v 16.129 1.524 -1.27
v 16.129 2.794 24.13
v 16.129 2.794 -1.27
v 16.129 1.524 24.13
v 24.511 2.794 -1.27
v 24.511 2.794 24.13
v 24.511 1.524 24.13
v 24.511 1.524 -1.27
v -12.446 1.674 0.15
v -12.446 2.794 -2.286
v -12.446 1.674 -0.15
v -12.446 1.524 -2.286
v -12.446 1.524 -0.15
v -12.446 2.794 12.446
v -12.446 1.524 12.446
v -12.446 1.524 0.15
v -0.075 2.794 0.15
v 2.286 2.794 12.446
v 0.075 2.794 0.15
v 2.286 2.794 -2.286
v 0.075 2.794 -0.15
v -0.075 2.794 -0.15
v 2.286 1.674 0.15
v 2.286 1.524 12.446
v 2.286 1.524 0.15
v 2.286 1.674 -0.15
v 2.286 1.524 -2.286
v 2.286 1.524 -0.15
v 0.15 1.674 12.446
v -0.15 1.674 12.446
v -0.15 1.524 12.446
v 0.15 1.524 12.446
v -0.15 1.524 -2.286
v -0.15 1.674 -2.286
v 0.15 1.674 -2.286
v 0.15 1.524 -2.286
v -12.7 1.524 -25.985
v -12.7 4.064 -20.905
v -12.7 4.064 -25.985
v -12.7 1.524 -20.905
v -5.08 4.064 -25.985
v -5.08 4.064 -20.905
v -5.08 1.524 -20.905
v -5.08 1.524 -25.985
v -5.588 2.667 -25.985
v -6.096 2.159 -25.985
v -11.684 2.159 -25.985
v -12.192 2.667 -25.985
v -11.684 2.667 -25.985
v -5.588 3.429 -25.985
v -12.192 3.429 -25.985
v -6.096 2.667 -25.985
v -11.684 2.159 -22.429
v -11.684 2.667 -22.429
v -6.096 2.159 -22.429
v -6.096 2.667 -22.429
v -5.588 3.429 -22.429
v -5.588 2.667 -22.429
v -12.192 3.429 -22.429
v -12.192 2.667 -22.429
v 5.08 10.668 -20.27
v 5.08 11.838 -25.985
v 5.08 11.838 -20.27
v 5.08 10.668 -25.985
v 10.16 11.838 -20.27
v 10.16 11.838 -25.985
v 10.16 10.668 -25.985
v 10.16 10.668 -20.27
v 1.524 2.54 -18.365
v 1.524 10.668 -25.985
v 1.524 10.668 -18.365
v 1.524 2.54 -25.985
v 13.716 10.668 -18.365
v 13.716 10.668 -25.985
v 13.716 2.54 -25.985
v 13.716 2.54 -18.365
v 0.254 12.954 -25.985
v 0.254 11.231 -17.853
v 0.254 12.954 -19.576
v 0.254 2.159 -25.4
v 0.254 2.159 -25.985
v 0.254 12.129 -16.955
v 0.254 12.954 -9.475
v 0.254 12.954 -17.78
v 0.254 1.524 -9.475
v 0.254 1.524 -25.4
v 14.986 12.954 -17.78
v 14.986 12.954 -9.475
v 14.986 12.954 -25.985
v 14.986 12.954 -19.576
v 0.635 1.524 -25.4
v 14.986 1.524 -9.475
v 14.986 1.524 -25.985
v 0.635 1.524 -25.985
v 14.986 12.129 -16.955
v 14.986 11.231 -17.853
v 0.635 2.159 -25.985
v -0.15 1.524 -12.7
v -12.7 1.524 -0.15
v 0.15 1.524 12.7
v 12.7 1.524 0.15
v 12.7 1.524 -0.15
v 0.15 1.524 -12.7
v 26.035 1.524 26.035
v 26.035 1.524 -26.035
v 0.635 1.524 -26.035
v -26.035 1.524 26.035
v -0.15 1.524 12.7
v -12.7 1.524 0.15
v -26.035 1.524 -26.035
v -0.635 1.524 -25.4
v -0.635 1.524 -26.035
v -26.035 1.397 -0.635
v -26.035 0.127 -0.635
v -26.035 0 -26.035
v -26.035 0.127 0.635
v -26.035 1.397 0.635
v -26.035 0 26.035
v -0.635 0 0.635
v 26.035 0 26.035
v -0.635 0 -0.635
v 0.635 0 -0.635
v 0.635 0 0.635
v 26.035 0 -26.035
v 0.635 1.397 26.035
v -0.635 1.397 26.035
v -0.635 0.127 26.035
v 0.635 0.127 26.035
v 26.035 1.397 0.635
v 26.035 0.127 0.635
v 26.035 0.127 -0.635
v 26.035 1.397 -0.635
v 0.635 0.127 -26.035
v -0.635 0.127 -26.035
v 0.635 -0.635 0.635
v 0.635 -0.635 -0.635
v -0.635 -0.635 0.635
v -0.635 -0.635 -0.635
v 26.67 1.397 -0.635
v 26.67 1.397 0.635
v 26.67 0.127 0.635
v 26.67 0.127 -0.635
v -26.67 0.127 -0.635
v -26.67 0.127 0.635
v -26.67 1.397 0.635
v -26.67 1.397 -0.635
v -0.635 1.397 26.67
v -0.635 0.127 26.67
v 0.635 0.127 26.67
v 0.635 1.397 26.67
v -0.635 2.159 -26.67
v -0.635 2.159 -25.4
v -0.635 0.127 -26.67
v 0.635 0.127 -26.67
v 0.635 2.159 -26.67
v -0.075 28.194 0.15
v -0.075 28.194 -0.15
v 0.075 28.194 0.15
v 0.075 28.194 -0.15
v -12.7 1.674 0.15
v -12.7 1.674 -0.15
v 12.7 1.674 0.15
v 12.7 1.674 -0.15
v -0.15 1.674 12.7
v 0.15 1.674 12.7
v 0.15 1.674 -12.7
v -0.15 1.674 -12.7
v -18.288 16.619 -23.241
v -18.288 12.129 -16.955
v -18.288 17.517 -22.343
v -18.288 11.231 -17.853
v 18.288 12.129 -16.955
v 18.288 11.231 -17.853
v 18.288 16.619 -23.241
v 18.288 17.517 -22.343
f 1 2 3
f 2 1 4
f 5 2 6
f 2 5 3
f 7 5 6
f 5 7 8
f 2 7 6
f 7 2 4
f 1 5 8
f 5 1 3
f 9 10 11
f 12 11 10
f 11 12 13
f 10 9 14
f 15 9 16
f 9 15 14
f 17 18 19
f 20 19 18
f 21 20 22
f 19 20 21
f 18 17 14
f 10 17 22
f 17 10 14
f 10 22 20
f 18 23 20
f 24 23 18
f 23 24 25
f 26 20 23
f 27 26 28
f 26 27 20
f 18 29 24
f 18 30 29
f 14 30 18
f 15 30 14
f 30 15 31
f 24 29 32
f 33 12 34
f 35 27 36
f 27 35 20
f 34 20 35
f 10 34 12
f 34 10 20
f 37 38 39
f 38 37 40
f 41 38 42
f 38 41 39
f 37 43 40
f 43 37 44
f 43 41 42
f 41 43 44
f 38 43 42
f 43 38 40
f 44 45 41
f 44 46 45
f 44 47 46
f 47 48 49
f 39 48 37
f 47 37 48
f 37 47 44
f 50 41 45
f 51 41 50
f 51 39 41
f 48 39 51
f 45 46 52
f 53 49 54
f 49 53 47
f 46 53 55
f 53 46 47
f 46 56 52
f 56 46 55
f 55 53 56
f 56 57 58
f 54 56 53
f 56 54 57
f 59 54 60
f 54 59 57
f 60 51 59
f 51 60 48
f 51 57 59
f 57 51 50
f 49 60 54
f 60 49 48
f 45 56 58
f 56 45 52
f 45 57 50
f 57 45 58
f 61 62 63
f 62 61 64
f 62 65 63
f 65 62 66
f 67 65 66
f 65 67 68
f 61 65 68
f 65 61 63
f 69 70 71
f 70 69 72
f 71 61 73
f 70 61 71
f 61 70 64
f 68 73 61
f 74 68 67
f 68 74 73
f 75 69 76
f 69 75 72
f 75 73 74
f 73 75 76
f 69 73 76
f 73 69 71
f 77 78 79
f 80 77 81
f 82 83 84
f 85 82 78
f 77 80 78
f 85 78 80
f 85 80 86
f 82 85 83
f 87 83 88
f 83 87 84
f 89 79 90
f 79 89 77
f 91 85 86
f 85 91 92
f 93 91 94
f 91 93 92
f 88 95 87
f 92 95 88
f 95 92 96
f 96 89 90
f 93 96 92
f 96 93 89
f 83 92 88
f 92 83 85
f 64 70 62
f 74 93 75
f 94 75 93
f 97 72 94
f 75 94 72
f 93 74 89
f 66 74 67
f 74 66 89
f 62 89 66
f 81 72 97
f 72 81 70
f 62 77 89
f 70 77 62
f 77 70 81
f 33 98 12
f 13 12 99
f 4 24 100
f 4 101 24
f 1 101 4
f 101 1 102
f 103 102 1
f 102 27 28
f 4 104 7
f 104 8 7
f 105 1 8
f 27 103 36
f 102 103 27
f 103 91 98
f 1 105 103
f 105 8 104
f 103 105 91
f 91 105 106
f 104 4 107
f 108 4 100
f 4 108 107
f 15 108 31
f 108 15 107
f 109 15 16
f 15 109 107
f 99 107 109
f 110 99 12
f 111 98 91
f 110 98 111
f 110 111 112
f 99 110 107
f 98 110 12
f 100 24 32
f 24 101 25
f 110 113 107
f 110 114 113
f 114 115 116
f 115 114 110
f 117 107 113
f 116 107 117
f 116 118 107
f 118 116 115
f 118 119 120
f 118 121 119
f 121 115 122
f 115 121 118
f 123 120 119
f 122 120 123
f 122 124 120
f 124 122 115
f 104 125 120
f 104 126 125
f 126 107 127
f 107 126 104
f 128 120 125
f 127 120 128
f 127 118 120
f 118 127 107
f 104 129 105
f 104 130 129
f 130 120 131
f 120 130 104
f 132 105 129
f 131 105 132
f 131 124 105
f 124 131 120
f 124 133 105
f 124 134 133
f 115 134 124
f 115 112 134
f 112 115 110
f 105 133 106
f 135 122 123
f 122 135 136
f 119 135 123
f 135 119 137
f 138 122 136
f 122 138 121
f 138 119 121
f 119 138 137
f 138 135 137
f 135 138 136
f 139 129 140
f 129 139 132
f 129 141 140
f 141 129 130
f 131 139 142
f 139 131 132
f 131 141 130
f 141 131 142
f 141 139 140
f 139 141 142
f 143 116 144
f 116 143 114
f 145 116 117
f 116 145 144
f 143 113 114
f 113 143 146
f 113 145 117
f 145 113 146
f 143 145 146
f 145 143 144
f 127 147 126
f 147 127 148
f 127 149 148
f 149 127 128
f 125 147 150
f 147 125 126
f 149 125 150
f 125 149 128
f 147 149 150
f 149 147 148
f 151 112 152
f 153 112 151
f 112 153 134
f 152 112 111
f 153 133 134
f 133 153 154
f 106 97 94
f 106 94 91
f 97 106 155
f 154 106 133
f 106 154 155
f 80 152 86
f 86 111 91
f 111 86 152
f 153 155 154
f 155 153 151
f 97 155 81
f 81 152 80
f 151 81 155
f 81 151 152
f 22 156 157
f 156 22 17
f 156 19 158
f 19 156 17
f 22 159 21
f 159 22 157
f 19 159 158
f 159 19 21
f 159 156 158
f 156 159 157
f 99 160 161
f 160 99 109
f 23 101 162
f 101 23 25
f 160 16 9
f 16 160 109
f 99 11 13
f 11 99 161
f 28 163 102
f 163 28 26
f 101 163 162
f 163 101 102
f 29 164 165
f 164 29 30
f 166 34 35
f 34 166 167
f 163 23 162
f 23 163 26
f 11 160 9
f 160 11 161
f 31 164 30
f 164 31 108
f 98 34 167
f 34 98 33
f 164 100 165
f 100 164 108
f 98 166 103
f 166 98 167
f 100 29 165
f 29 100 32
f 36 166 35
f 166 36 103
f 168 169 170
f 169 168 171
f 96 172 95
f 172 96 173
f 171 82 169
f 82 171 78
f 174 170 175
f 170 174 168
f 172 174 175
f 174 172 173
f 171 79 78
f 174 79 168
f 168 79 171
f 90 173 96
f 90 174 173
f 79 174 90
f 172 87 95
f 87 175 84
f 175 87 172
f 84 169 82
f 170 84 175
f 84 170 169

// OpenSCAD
// file: ../mocad/moRJ45SocketSmall.scad
include <../mo/mo.scad>

moRJ45SocketSmall_Height = 0.65 * in;
moRJ45SocketSmall_Width = 0.58 * in;
moRJ45SocketSmall_Depth = 0.45 * in;
moRJ45SocketSmall_SideWall = 0.05 * in;
moRJ45SocketSmall_BottomWall = 0.05 * in;
moRJ45SocketSmall_TopWall = 0.08 * in;
moRJ45SocketSmall_BackWall = 0.35 * in;
moRJ45SocketSmall_TabHeight = 0.6 * in;
moRJ45SocketSmall_TabDepth = 0.05* in;
moRJ45SocketSmall_TabWidth = 0.2 * in;

positions = [ 
  [ [ 0, 0, 0 ], [ 0, 0, 1 ], 0 ],
  [ [ 0, -moRJ45SocketSmall_Height/2, -moRJ45SocketSmall_Depth/2 ], [ 1, 0, 0 ], 0 ]
];

module moRJ45SocketSmall( p = 0, info = false ) {
  moPresent( positions, p, info ) {
     color( Aluminum ) {
      difference() {
        cube( [ moRJ45SocketSmall_Width, moRJ45SocketSmall_Height, moRJ45SocketSmall_Depth ], center = true );
        translate( [ 0, -moRJ45SocketSmall_BackWall, -moRJ45SocketSmall_BottomWall/2 ] ) {
          translate( [ 0, -0.05*in, moRJ45SocketSmall_Depth / 2 - moRJ45SocketSmall_TopWall / 2 - Epsilon ] )
              cube( [ moRJ45SocketSmall_TabWidth, 
                      moRJ45SocketSmall_TabHeight, 
                      moRJ45SocketSmall_TabDepth ], center = true );
          cube( [ moRJ45SocketSmall_Width - 2 * moRJ45SocketSmall_SideWall, 
                  moRJ45SocketSmall_Height, 
                  moRJ45SocketSmall_Depth - moRJ45SocketSmall_TopWall - moRJ45SocketSmall_BottomWall ], center = true );
        }
        }
      }
    
  }
}


function moRJ45SocketSmallPosition( p = 0 ) = positions[ p ];

moMoveOriginTo( moRJ45SocketSmallPosition( 0 ) ) {
  moRJ45SocketSmall( 0, info = true, $name = true );
}
// file: ../mocad/moMicroUSB.scad
include <../mo/mo.scad>

moMicroUSB_Height = 0.2 * in;
moMicroUSB_Width = 0.3 * in;
moMicroUSB_Depth = 0.1 * in;
moMicroUSB_Wall = 0.02 * in;

positions = [ 
  [ [ 0, 0, 0 ], [ 0, 0, 1 ], 0 ],
  [ [ 0, -moMicroUSB_Height/2, -moMicroUSB_Depth/2 ], [ 1, 0, 0 ], 0 ]
];

module moMicroUSB( p = 0, info = false, name = false ) {
  moPresent( positions, p, info ) {
    // USB Connector
      color( Aluminum ) {
        difference() {
          cube( [ moMicroUSB_Width, moMicroUSB_Height, moMicroUSB_Depth ], center = true );
          translate( [ 0, -2 * moMicroUSB_Wall, -moMicroUSB_Wall/ 2] )
            cube( [ moMicroUSB_Width - 4 * moMicroUSB_Wall, 
                  moMicroUSB_Height - 2 * moMicroUSB_Wall, 
                  ( moMicroUSB_Depth - 2 * moMicroUSB_Wall ) / 2 ], center = true );
          translate( [ 0, -2 * moMicroUSB_Wall, moMicroUSB_Wall / 2 ] )
            cube( [ moMicroUSB_Width - 2 * moMicroUSB_Wall, 
                  moMicroUSB_Height - 2 * moMicroUSB_Wall, 
                  ( moMicroUSB_Depth - 2 * moMicroUSB_Wall ) / 2 ], center = true );
        
        }
      }
    
  }
}


function moMicroUSBPosition( p = 0 ) = positions[ p ];

moMoveOriginTo(moMicroUSBPosition( 1 ) ) {
  moMicroUSB( 1, info = true, $name = true );
}
// file: ../mocad/moPCB.scad
include <../mo/mo.scad>

PCBColor = [ 0, 0.3, 0 ];
PCBThickness = 0.06 * in;
PCBWidth = 1.5 * in;
PCBHeight = 1 * in;
PCBSpacing = 0.1 * in;
PCBMoldingLength = 0.45 * in;

module moPCB( width = PCBWidth, height = PCBHeight, color = PCBColor, thickness = PCBThickness, info = false ) {
  moPitch(-1)
  color( color ) {
    linear_extrude( height = thickness, twist = 0 ) {
      difference() {
        square( [ width, height ], center = true );
        children();
      }
    }
  }
  if ( info ) {
    moPartOrigin();
    for ( i = [ 0 : 5 ] )
      moMoveTo( moPCBPosition( i, width, height, thickness ) )
        moPosition( i );
  }
  if ( $name )
    moPartLabel( parent_module( 1 ) );
}

moPCBPositions = [
  [ [ 0, 0, 0 ], [ 0, 0, 1 ], 0 ],
  [ [ 0, 1, 0 ], [ 0, 0, 1 ], 180 ],
  [ [ 0.5, 0.5, 0 ], [ 0, 0, 1 ], 90 ],
  [ [ -0.5, 0.5, 0 ], [ 0, 0, 1 ], -90 ],
  [ [ 0, 0.5, 0.5 ], [ 1, 0, 0 ], -90 ],
  [ [ 0, 0.5, -0.5 ], [ 1, 0, 0 ], 90 ],
];

function vs( a, b ) = [ a[0]*b[0], a[1]*b[1], a[2]*b[2] ];

function moPCBPosition( p = 0, width = PCBWidth, height = PCBHeight, thickness = PCBThickness ) = [
  vs( moPCBPositions[ p ][ 0 ], [ width, thickness, height ] ),
  moPCBPositions[ p ][ 1 ], 
  moPCBPositions[ p ][ 2 ] 
];

module moPCBSIPMolding( x = 10, spacing = PCBSpacing, length = PCBMoldingLength, thickness = PCBSpacing/2, info = false ) {
  shift = length / 2;
  color( Black )
    translate( [ 0, length/2, 0 ] )
      cube( [ x * spacing, length, thickness ], center = true );
  if ( info ) {
    moPartOrigin();
    for ( i = [ 0 : 5 ] )
      moMoveTo( moPCBSIPMoldingPosition( i, x, spacing, length, thickness ) )
        moPosition( i );
  }
  if ( $name )
    moPartLabel( parent_module( 1 ) );
}

function moPCBSIPMoldingPosition( p = 0, x = 10, spacing = PCBSpacing, length = PCBMoldingLength, thickness = PCBSpacing / 2 ) = 
[
  vs( moPCBPositions[ p ][ 0 ], [ x * spacing, length, thickness ] ),
  moPCBPositions[ p ][ 1 ], 
  moPCBPositions[ p ][ 2 ] 
];

module moPCBPins( x = 10, spacing = 0.1 * in, diameter = 0.02 * in, length = 0.3 * in, ascent = 0.025 * in, info = false, center = true ) {
  shift = length / 2 - ascent;
  moPitch() {
    for ( xi = [ 0 : x - 1 ] ) {      
      translate( [ ( xi - (( center ) ? x / 2 - 0.5 : 0 ) ) * spacing, 0, 0  ] ) {
        translate( [ 0, 0, -shift ] ) {
          color( Copper )
            moYaw( 0.5 )
              cylinder( h = length, d = diameter, center = true, $fn = 4 );        
        }
      if ( info )
        moPitch( - 1 ) moPosition( xi );
      }
    }
  }
  if ( info )
    moPartOrigin();
  if ( $name )
    moPartLabel( parent_module( 1 ) );
}

function moPCBPinsPosition( x, xSize = 10, spacing = 0.1, center = true ) = [ ( x - (( center ) ? x / 2 - 0.5 : 0 ) ) * spacing, 0 ];

module moPCBHoles( x = 10, spacing = 0.1 * in, drill = 0.02 * in, info = false, center = true ) {
  for ( xi = [ 0 : x - 1 ] ) {      
    translate( [ ( xi - (( center ) ? x / 2 - 0.5 : 0 ) ) * spacing, 0 ] ) {
      circle( d = drill, center = true );        
      if ( info )
        moPitch( - 1 ) moPosition( xi );
    }
  }
  if ( info )
    moPartOrigin();
  if ( $name )
    moPartLabel( parent_module( 1 ) );
}

function moPCBHolesPosition( x, xSize = 10, spacing = 0.1, center = true ) = [ ( x - (( center ) ? x / 2 - 0.5 : 0 ) ) * spacing, 0 ];


module moPCBHoleGrid( x = 10, y = 10, spacing = 0.1 * in, drill = 0.02 * in, info = false, center = true ) {
  c = ( center ) ? [ x / 2 - 0.5, y / 2 - 0.5] : [ 0, 0 ];
  for ( yi = [ 0 : y - 1 ] ) {
    for ( xi = [ 0 : x - 1 ] ) {      
      translate( [ ( xi - c[ 0 ] ) * spacing, ( yi - c[ 1 ] ) * spacing  ], 0 ) {
        circle( d = drill, center = true );        
        if ( info )
          moPitch( - 1 ) moPosition2( [ xi, yi ] );
      }
    }
  }
  if ( info )
    moPartOrigin();
  if ( $name )
    moPartLabel( parent_module( 1 ) );
}

function moPCBHoleGrid( x, xSize = 10, ySize = 10, spacing = 0.1, center = true ) = 
  [ ( x - (( center ) ? x / 2 - 0.5 : 0 ) ) * spacing, ( y - (( center ) ? y / 2 - 0.5 : 0 ) ) * spacing ];


//moMoveOriginTo( moGridPosition( [ 2, 2, ] ) )

translate( [ -6 * in, 0, 0 ] ) {
  moPCB( 1.5 * in, 1 * in, info = true, $name = true )
    moPCBHoles( 10, 0.1 * in, 0.04 * in );
  moPCBPins( 10, 0.1 * in, length = 0.6 * in );
  moMoveTo( moPCBPosition( 1  ) )
    moFlip()
      moPCBSIPMolding( 10, length = 0.44 * in );
}
translate( [ -4 * in, 0, 0 ] )
   moPCBSIPMolding( 10, 0.1 * in, 0.5 * in, 0.05 * in, info = true, $name = true );
translate( [ -2 * in, 0, 0 ] )
   moPCBPins( 10, 0.1 * in, 0.02 * in, info = true, $name = true );
translate( [ 0 * in, 0, 0 ] )
  moPCBHoles( 10, info = true, $name = true );
translate( [ 2 * in, 0, 0 ] )
moPCBHoleGrid( 10, 10, info = true, $name = true );
// main file
include <../mo/mo.scad>
use<../mocad/moPCB.scad>
use <../mocad/moMicroUSB.scad>
use <../mocad/moRJ45SocketSmall.scad>

$internalDetail = true;

WR703N_ComponentHeight = 0.03 * in;
WR703N_PCBDepth = 0.06 * in;
WR703N_Height = 2.05 * in;
WR703N_Width = 2.05 * in;
WR703N_Depth = WR703N_ComponentHeight + WR703N_PCBDepth;
WR703N_WireSpacing = 0.1 * in;

WR703N_PCBColor = [ 0, 0.2, 0 ];

WR703N_RAM_ChipHeight = 1.0 * in;
WR703N_RAM_ChipWidth = 0.33 * in;
WR703N_RAM_ChipDepth = 0.05 * in;
WR703N_RAM_ChipXOffset = -0.8 * in;
WR703N_RAM_ChipYOffset = 0.45 * in;

WR703N_CPU_ChipHeight = 0.58 * in;
WR703N_CPU_ChipWidth = 0.58 * in;
WR703N_CPU_ChipDepth = 0.05 * in;
WR703N_CPU_ChipXOffset = 0.2 * in;
WR703N_CPU_ChipYOffset = 0.2 * in;

WR703N_PushButtonHeight = 0.1 * in;
WR703N_PushButtonWidth = 0.165 * in;
WR703N_PushButtonDepth = 0.05 * in;

WR703N_PushButtonActuatorHeight = 0.06 * in;
WR703N_PushButtonActuatorWidth = 0.08 * in;
WR703N_PushButtonActuatorDepth = 0.03 * in;

WR703N_PCBSignals = 14;
WR703N_PCBSignalsWidth = 0.6 * in;
WR703N_PCBSignalSpacing = 0.1 * in;
WR703N_PCBSignalHoleDiameter = 0.03 * in;

WR703N_PushButtonOffset = WR703N_Height/2 - 0.168 * in;

WR703N_USBMicroConnectorYOffset = -(WR703N_Height)/2 + 0.05;
WR703N_USBMicroConnectorXOffset = (0.15 + 0.2)*in;
WR703N_USBMicroConnectorDepth = 0;

WR703N_RJ45ConnectorYOffset = -(WR703N_Height)/2 + 0.05;
WR703N_RJ45ConnectorXOffset = (-0.35 + 0.05)*in;

positions = [ 
  [ [ 0, 0, 0 ], [ 0, 0, 1 ], 0 ],
  [ [ 0, WR703N_PCBDepth, 0 ], [ 0, 0, 1 ], 180 ],

  [ [ -WR703N_Width/2, WR703N_PCBDepth / 2, 0 ], [0, 0, 1 ], -90 ], 
  [ [ +WR703N_Width/2, WR703N_PCBDepth / 2, 0 ], [0, 0, 1 ], 90 ], 
  [ [ 0, WR703N_PCBDepth / 2, WR703N_Height/2 ], [1, 0, 0 ], -90 ], 
  [ [ 0, WR703N_PCBDepth / 2, -WR703N_Height/2 ], [1, 0, 0 ], 90 ], 

  [ [ 0, -WR703N_USBMicroConnectorDepth/2, -WR703N_Height/2 ], [ 1, 0, 0 ], 90 ],
     
];

module tpWR703N( p = 0, info = false ) {
  moPresent( positions, p, info ) {
    difference() {
      moPCB( WR703N_Width, WR703N_Height, color = WR703N_PCBColor, thickness = WR703N_PCBDepth, $name = false );
    }

    moPitch() moPose( t = [ 0, 0, -WR703N_PCBDepth ] ) {
         union() {
           if ( $internalDetail ) {
            // RAM Chip
            translate( [ WR703N_RAM_ChipXOffset, WR703N_RAM_ChipYOffset, WR703N_PCBDepth + WR703N_RAM_ChipDepth / 2] ) {
              color( [ 0, 0, 0 ] ) {
                cube( [ WR703N_RAM_ChipWidth, WR703N_RAM_ChipHeight,WR703N_RAM_ChipDepth ], center = true );                
              }
            }
            // CPU Chip
            translate( [ WR703N_CPU_ChipXOffset, WR703N_CPU_ChipYOffset, WR703N_PCBDepth + WR703N_CPU_ChipDepth / 2] ) {
              color( [ 0, 0, 0 ]  ) {
                cube( [ WR703N_CPU_ChipWidth, WR703N_CPU_ChipHeight,WR703N_CPU_ChipDepth ], center = true );                
              }
            }
          }
          // USB Connector 1
          translate( [ WR703N_USBMicroConnectorXOffset, WR703N_USBMicroConnectorYOffset, WR703N_PCBDepth ] ) {
              moMicroUSB( 1, $name = false, info = false );
          }
          // Ethernet Connector
          translate( [ WR703N_RJ45ConnectorXOffset, WR703N_RJ45ConnectorYOffset, WR703N_PCBDepth ] ) {
              moRJ45SocketSmall( 1, $name = false, info = false );
          }
      }
    }
  }
}


function tpWR703NPosition( p = 0 ) = positions[ p ];

moMoveOriginTo( tpWR703NPosition( 1 ) ) {
  tpWR703N( 0, info = true, $name = true );
}
